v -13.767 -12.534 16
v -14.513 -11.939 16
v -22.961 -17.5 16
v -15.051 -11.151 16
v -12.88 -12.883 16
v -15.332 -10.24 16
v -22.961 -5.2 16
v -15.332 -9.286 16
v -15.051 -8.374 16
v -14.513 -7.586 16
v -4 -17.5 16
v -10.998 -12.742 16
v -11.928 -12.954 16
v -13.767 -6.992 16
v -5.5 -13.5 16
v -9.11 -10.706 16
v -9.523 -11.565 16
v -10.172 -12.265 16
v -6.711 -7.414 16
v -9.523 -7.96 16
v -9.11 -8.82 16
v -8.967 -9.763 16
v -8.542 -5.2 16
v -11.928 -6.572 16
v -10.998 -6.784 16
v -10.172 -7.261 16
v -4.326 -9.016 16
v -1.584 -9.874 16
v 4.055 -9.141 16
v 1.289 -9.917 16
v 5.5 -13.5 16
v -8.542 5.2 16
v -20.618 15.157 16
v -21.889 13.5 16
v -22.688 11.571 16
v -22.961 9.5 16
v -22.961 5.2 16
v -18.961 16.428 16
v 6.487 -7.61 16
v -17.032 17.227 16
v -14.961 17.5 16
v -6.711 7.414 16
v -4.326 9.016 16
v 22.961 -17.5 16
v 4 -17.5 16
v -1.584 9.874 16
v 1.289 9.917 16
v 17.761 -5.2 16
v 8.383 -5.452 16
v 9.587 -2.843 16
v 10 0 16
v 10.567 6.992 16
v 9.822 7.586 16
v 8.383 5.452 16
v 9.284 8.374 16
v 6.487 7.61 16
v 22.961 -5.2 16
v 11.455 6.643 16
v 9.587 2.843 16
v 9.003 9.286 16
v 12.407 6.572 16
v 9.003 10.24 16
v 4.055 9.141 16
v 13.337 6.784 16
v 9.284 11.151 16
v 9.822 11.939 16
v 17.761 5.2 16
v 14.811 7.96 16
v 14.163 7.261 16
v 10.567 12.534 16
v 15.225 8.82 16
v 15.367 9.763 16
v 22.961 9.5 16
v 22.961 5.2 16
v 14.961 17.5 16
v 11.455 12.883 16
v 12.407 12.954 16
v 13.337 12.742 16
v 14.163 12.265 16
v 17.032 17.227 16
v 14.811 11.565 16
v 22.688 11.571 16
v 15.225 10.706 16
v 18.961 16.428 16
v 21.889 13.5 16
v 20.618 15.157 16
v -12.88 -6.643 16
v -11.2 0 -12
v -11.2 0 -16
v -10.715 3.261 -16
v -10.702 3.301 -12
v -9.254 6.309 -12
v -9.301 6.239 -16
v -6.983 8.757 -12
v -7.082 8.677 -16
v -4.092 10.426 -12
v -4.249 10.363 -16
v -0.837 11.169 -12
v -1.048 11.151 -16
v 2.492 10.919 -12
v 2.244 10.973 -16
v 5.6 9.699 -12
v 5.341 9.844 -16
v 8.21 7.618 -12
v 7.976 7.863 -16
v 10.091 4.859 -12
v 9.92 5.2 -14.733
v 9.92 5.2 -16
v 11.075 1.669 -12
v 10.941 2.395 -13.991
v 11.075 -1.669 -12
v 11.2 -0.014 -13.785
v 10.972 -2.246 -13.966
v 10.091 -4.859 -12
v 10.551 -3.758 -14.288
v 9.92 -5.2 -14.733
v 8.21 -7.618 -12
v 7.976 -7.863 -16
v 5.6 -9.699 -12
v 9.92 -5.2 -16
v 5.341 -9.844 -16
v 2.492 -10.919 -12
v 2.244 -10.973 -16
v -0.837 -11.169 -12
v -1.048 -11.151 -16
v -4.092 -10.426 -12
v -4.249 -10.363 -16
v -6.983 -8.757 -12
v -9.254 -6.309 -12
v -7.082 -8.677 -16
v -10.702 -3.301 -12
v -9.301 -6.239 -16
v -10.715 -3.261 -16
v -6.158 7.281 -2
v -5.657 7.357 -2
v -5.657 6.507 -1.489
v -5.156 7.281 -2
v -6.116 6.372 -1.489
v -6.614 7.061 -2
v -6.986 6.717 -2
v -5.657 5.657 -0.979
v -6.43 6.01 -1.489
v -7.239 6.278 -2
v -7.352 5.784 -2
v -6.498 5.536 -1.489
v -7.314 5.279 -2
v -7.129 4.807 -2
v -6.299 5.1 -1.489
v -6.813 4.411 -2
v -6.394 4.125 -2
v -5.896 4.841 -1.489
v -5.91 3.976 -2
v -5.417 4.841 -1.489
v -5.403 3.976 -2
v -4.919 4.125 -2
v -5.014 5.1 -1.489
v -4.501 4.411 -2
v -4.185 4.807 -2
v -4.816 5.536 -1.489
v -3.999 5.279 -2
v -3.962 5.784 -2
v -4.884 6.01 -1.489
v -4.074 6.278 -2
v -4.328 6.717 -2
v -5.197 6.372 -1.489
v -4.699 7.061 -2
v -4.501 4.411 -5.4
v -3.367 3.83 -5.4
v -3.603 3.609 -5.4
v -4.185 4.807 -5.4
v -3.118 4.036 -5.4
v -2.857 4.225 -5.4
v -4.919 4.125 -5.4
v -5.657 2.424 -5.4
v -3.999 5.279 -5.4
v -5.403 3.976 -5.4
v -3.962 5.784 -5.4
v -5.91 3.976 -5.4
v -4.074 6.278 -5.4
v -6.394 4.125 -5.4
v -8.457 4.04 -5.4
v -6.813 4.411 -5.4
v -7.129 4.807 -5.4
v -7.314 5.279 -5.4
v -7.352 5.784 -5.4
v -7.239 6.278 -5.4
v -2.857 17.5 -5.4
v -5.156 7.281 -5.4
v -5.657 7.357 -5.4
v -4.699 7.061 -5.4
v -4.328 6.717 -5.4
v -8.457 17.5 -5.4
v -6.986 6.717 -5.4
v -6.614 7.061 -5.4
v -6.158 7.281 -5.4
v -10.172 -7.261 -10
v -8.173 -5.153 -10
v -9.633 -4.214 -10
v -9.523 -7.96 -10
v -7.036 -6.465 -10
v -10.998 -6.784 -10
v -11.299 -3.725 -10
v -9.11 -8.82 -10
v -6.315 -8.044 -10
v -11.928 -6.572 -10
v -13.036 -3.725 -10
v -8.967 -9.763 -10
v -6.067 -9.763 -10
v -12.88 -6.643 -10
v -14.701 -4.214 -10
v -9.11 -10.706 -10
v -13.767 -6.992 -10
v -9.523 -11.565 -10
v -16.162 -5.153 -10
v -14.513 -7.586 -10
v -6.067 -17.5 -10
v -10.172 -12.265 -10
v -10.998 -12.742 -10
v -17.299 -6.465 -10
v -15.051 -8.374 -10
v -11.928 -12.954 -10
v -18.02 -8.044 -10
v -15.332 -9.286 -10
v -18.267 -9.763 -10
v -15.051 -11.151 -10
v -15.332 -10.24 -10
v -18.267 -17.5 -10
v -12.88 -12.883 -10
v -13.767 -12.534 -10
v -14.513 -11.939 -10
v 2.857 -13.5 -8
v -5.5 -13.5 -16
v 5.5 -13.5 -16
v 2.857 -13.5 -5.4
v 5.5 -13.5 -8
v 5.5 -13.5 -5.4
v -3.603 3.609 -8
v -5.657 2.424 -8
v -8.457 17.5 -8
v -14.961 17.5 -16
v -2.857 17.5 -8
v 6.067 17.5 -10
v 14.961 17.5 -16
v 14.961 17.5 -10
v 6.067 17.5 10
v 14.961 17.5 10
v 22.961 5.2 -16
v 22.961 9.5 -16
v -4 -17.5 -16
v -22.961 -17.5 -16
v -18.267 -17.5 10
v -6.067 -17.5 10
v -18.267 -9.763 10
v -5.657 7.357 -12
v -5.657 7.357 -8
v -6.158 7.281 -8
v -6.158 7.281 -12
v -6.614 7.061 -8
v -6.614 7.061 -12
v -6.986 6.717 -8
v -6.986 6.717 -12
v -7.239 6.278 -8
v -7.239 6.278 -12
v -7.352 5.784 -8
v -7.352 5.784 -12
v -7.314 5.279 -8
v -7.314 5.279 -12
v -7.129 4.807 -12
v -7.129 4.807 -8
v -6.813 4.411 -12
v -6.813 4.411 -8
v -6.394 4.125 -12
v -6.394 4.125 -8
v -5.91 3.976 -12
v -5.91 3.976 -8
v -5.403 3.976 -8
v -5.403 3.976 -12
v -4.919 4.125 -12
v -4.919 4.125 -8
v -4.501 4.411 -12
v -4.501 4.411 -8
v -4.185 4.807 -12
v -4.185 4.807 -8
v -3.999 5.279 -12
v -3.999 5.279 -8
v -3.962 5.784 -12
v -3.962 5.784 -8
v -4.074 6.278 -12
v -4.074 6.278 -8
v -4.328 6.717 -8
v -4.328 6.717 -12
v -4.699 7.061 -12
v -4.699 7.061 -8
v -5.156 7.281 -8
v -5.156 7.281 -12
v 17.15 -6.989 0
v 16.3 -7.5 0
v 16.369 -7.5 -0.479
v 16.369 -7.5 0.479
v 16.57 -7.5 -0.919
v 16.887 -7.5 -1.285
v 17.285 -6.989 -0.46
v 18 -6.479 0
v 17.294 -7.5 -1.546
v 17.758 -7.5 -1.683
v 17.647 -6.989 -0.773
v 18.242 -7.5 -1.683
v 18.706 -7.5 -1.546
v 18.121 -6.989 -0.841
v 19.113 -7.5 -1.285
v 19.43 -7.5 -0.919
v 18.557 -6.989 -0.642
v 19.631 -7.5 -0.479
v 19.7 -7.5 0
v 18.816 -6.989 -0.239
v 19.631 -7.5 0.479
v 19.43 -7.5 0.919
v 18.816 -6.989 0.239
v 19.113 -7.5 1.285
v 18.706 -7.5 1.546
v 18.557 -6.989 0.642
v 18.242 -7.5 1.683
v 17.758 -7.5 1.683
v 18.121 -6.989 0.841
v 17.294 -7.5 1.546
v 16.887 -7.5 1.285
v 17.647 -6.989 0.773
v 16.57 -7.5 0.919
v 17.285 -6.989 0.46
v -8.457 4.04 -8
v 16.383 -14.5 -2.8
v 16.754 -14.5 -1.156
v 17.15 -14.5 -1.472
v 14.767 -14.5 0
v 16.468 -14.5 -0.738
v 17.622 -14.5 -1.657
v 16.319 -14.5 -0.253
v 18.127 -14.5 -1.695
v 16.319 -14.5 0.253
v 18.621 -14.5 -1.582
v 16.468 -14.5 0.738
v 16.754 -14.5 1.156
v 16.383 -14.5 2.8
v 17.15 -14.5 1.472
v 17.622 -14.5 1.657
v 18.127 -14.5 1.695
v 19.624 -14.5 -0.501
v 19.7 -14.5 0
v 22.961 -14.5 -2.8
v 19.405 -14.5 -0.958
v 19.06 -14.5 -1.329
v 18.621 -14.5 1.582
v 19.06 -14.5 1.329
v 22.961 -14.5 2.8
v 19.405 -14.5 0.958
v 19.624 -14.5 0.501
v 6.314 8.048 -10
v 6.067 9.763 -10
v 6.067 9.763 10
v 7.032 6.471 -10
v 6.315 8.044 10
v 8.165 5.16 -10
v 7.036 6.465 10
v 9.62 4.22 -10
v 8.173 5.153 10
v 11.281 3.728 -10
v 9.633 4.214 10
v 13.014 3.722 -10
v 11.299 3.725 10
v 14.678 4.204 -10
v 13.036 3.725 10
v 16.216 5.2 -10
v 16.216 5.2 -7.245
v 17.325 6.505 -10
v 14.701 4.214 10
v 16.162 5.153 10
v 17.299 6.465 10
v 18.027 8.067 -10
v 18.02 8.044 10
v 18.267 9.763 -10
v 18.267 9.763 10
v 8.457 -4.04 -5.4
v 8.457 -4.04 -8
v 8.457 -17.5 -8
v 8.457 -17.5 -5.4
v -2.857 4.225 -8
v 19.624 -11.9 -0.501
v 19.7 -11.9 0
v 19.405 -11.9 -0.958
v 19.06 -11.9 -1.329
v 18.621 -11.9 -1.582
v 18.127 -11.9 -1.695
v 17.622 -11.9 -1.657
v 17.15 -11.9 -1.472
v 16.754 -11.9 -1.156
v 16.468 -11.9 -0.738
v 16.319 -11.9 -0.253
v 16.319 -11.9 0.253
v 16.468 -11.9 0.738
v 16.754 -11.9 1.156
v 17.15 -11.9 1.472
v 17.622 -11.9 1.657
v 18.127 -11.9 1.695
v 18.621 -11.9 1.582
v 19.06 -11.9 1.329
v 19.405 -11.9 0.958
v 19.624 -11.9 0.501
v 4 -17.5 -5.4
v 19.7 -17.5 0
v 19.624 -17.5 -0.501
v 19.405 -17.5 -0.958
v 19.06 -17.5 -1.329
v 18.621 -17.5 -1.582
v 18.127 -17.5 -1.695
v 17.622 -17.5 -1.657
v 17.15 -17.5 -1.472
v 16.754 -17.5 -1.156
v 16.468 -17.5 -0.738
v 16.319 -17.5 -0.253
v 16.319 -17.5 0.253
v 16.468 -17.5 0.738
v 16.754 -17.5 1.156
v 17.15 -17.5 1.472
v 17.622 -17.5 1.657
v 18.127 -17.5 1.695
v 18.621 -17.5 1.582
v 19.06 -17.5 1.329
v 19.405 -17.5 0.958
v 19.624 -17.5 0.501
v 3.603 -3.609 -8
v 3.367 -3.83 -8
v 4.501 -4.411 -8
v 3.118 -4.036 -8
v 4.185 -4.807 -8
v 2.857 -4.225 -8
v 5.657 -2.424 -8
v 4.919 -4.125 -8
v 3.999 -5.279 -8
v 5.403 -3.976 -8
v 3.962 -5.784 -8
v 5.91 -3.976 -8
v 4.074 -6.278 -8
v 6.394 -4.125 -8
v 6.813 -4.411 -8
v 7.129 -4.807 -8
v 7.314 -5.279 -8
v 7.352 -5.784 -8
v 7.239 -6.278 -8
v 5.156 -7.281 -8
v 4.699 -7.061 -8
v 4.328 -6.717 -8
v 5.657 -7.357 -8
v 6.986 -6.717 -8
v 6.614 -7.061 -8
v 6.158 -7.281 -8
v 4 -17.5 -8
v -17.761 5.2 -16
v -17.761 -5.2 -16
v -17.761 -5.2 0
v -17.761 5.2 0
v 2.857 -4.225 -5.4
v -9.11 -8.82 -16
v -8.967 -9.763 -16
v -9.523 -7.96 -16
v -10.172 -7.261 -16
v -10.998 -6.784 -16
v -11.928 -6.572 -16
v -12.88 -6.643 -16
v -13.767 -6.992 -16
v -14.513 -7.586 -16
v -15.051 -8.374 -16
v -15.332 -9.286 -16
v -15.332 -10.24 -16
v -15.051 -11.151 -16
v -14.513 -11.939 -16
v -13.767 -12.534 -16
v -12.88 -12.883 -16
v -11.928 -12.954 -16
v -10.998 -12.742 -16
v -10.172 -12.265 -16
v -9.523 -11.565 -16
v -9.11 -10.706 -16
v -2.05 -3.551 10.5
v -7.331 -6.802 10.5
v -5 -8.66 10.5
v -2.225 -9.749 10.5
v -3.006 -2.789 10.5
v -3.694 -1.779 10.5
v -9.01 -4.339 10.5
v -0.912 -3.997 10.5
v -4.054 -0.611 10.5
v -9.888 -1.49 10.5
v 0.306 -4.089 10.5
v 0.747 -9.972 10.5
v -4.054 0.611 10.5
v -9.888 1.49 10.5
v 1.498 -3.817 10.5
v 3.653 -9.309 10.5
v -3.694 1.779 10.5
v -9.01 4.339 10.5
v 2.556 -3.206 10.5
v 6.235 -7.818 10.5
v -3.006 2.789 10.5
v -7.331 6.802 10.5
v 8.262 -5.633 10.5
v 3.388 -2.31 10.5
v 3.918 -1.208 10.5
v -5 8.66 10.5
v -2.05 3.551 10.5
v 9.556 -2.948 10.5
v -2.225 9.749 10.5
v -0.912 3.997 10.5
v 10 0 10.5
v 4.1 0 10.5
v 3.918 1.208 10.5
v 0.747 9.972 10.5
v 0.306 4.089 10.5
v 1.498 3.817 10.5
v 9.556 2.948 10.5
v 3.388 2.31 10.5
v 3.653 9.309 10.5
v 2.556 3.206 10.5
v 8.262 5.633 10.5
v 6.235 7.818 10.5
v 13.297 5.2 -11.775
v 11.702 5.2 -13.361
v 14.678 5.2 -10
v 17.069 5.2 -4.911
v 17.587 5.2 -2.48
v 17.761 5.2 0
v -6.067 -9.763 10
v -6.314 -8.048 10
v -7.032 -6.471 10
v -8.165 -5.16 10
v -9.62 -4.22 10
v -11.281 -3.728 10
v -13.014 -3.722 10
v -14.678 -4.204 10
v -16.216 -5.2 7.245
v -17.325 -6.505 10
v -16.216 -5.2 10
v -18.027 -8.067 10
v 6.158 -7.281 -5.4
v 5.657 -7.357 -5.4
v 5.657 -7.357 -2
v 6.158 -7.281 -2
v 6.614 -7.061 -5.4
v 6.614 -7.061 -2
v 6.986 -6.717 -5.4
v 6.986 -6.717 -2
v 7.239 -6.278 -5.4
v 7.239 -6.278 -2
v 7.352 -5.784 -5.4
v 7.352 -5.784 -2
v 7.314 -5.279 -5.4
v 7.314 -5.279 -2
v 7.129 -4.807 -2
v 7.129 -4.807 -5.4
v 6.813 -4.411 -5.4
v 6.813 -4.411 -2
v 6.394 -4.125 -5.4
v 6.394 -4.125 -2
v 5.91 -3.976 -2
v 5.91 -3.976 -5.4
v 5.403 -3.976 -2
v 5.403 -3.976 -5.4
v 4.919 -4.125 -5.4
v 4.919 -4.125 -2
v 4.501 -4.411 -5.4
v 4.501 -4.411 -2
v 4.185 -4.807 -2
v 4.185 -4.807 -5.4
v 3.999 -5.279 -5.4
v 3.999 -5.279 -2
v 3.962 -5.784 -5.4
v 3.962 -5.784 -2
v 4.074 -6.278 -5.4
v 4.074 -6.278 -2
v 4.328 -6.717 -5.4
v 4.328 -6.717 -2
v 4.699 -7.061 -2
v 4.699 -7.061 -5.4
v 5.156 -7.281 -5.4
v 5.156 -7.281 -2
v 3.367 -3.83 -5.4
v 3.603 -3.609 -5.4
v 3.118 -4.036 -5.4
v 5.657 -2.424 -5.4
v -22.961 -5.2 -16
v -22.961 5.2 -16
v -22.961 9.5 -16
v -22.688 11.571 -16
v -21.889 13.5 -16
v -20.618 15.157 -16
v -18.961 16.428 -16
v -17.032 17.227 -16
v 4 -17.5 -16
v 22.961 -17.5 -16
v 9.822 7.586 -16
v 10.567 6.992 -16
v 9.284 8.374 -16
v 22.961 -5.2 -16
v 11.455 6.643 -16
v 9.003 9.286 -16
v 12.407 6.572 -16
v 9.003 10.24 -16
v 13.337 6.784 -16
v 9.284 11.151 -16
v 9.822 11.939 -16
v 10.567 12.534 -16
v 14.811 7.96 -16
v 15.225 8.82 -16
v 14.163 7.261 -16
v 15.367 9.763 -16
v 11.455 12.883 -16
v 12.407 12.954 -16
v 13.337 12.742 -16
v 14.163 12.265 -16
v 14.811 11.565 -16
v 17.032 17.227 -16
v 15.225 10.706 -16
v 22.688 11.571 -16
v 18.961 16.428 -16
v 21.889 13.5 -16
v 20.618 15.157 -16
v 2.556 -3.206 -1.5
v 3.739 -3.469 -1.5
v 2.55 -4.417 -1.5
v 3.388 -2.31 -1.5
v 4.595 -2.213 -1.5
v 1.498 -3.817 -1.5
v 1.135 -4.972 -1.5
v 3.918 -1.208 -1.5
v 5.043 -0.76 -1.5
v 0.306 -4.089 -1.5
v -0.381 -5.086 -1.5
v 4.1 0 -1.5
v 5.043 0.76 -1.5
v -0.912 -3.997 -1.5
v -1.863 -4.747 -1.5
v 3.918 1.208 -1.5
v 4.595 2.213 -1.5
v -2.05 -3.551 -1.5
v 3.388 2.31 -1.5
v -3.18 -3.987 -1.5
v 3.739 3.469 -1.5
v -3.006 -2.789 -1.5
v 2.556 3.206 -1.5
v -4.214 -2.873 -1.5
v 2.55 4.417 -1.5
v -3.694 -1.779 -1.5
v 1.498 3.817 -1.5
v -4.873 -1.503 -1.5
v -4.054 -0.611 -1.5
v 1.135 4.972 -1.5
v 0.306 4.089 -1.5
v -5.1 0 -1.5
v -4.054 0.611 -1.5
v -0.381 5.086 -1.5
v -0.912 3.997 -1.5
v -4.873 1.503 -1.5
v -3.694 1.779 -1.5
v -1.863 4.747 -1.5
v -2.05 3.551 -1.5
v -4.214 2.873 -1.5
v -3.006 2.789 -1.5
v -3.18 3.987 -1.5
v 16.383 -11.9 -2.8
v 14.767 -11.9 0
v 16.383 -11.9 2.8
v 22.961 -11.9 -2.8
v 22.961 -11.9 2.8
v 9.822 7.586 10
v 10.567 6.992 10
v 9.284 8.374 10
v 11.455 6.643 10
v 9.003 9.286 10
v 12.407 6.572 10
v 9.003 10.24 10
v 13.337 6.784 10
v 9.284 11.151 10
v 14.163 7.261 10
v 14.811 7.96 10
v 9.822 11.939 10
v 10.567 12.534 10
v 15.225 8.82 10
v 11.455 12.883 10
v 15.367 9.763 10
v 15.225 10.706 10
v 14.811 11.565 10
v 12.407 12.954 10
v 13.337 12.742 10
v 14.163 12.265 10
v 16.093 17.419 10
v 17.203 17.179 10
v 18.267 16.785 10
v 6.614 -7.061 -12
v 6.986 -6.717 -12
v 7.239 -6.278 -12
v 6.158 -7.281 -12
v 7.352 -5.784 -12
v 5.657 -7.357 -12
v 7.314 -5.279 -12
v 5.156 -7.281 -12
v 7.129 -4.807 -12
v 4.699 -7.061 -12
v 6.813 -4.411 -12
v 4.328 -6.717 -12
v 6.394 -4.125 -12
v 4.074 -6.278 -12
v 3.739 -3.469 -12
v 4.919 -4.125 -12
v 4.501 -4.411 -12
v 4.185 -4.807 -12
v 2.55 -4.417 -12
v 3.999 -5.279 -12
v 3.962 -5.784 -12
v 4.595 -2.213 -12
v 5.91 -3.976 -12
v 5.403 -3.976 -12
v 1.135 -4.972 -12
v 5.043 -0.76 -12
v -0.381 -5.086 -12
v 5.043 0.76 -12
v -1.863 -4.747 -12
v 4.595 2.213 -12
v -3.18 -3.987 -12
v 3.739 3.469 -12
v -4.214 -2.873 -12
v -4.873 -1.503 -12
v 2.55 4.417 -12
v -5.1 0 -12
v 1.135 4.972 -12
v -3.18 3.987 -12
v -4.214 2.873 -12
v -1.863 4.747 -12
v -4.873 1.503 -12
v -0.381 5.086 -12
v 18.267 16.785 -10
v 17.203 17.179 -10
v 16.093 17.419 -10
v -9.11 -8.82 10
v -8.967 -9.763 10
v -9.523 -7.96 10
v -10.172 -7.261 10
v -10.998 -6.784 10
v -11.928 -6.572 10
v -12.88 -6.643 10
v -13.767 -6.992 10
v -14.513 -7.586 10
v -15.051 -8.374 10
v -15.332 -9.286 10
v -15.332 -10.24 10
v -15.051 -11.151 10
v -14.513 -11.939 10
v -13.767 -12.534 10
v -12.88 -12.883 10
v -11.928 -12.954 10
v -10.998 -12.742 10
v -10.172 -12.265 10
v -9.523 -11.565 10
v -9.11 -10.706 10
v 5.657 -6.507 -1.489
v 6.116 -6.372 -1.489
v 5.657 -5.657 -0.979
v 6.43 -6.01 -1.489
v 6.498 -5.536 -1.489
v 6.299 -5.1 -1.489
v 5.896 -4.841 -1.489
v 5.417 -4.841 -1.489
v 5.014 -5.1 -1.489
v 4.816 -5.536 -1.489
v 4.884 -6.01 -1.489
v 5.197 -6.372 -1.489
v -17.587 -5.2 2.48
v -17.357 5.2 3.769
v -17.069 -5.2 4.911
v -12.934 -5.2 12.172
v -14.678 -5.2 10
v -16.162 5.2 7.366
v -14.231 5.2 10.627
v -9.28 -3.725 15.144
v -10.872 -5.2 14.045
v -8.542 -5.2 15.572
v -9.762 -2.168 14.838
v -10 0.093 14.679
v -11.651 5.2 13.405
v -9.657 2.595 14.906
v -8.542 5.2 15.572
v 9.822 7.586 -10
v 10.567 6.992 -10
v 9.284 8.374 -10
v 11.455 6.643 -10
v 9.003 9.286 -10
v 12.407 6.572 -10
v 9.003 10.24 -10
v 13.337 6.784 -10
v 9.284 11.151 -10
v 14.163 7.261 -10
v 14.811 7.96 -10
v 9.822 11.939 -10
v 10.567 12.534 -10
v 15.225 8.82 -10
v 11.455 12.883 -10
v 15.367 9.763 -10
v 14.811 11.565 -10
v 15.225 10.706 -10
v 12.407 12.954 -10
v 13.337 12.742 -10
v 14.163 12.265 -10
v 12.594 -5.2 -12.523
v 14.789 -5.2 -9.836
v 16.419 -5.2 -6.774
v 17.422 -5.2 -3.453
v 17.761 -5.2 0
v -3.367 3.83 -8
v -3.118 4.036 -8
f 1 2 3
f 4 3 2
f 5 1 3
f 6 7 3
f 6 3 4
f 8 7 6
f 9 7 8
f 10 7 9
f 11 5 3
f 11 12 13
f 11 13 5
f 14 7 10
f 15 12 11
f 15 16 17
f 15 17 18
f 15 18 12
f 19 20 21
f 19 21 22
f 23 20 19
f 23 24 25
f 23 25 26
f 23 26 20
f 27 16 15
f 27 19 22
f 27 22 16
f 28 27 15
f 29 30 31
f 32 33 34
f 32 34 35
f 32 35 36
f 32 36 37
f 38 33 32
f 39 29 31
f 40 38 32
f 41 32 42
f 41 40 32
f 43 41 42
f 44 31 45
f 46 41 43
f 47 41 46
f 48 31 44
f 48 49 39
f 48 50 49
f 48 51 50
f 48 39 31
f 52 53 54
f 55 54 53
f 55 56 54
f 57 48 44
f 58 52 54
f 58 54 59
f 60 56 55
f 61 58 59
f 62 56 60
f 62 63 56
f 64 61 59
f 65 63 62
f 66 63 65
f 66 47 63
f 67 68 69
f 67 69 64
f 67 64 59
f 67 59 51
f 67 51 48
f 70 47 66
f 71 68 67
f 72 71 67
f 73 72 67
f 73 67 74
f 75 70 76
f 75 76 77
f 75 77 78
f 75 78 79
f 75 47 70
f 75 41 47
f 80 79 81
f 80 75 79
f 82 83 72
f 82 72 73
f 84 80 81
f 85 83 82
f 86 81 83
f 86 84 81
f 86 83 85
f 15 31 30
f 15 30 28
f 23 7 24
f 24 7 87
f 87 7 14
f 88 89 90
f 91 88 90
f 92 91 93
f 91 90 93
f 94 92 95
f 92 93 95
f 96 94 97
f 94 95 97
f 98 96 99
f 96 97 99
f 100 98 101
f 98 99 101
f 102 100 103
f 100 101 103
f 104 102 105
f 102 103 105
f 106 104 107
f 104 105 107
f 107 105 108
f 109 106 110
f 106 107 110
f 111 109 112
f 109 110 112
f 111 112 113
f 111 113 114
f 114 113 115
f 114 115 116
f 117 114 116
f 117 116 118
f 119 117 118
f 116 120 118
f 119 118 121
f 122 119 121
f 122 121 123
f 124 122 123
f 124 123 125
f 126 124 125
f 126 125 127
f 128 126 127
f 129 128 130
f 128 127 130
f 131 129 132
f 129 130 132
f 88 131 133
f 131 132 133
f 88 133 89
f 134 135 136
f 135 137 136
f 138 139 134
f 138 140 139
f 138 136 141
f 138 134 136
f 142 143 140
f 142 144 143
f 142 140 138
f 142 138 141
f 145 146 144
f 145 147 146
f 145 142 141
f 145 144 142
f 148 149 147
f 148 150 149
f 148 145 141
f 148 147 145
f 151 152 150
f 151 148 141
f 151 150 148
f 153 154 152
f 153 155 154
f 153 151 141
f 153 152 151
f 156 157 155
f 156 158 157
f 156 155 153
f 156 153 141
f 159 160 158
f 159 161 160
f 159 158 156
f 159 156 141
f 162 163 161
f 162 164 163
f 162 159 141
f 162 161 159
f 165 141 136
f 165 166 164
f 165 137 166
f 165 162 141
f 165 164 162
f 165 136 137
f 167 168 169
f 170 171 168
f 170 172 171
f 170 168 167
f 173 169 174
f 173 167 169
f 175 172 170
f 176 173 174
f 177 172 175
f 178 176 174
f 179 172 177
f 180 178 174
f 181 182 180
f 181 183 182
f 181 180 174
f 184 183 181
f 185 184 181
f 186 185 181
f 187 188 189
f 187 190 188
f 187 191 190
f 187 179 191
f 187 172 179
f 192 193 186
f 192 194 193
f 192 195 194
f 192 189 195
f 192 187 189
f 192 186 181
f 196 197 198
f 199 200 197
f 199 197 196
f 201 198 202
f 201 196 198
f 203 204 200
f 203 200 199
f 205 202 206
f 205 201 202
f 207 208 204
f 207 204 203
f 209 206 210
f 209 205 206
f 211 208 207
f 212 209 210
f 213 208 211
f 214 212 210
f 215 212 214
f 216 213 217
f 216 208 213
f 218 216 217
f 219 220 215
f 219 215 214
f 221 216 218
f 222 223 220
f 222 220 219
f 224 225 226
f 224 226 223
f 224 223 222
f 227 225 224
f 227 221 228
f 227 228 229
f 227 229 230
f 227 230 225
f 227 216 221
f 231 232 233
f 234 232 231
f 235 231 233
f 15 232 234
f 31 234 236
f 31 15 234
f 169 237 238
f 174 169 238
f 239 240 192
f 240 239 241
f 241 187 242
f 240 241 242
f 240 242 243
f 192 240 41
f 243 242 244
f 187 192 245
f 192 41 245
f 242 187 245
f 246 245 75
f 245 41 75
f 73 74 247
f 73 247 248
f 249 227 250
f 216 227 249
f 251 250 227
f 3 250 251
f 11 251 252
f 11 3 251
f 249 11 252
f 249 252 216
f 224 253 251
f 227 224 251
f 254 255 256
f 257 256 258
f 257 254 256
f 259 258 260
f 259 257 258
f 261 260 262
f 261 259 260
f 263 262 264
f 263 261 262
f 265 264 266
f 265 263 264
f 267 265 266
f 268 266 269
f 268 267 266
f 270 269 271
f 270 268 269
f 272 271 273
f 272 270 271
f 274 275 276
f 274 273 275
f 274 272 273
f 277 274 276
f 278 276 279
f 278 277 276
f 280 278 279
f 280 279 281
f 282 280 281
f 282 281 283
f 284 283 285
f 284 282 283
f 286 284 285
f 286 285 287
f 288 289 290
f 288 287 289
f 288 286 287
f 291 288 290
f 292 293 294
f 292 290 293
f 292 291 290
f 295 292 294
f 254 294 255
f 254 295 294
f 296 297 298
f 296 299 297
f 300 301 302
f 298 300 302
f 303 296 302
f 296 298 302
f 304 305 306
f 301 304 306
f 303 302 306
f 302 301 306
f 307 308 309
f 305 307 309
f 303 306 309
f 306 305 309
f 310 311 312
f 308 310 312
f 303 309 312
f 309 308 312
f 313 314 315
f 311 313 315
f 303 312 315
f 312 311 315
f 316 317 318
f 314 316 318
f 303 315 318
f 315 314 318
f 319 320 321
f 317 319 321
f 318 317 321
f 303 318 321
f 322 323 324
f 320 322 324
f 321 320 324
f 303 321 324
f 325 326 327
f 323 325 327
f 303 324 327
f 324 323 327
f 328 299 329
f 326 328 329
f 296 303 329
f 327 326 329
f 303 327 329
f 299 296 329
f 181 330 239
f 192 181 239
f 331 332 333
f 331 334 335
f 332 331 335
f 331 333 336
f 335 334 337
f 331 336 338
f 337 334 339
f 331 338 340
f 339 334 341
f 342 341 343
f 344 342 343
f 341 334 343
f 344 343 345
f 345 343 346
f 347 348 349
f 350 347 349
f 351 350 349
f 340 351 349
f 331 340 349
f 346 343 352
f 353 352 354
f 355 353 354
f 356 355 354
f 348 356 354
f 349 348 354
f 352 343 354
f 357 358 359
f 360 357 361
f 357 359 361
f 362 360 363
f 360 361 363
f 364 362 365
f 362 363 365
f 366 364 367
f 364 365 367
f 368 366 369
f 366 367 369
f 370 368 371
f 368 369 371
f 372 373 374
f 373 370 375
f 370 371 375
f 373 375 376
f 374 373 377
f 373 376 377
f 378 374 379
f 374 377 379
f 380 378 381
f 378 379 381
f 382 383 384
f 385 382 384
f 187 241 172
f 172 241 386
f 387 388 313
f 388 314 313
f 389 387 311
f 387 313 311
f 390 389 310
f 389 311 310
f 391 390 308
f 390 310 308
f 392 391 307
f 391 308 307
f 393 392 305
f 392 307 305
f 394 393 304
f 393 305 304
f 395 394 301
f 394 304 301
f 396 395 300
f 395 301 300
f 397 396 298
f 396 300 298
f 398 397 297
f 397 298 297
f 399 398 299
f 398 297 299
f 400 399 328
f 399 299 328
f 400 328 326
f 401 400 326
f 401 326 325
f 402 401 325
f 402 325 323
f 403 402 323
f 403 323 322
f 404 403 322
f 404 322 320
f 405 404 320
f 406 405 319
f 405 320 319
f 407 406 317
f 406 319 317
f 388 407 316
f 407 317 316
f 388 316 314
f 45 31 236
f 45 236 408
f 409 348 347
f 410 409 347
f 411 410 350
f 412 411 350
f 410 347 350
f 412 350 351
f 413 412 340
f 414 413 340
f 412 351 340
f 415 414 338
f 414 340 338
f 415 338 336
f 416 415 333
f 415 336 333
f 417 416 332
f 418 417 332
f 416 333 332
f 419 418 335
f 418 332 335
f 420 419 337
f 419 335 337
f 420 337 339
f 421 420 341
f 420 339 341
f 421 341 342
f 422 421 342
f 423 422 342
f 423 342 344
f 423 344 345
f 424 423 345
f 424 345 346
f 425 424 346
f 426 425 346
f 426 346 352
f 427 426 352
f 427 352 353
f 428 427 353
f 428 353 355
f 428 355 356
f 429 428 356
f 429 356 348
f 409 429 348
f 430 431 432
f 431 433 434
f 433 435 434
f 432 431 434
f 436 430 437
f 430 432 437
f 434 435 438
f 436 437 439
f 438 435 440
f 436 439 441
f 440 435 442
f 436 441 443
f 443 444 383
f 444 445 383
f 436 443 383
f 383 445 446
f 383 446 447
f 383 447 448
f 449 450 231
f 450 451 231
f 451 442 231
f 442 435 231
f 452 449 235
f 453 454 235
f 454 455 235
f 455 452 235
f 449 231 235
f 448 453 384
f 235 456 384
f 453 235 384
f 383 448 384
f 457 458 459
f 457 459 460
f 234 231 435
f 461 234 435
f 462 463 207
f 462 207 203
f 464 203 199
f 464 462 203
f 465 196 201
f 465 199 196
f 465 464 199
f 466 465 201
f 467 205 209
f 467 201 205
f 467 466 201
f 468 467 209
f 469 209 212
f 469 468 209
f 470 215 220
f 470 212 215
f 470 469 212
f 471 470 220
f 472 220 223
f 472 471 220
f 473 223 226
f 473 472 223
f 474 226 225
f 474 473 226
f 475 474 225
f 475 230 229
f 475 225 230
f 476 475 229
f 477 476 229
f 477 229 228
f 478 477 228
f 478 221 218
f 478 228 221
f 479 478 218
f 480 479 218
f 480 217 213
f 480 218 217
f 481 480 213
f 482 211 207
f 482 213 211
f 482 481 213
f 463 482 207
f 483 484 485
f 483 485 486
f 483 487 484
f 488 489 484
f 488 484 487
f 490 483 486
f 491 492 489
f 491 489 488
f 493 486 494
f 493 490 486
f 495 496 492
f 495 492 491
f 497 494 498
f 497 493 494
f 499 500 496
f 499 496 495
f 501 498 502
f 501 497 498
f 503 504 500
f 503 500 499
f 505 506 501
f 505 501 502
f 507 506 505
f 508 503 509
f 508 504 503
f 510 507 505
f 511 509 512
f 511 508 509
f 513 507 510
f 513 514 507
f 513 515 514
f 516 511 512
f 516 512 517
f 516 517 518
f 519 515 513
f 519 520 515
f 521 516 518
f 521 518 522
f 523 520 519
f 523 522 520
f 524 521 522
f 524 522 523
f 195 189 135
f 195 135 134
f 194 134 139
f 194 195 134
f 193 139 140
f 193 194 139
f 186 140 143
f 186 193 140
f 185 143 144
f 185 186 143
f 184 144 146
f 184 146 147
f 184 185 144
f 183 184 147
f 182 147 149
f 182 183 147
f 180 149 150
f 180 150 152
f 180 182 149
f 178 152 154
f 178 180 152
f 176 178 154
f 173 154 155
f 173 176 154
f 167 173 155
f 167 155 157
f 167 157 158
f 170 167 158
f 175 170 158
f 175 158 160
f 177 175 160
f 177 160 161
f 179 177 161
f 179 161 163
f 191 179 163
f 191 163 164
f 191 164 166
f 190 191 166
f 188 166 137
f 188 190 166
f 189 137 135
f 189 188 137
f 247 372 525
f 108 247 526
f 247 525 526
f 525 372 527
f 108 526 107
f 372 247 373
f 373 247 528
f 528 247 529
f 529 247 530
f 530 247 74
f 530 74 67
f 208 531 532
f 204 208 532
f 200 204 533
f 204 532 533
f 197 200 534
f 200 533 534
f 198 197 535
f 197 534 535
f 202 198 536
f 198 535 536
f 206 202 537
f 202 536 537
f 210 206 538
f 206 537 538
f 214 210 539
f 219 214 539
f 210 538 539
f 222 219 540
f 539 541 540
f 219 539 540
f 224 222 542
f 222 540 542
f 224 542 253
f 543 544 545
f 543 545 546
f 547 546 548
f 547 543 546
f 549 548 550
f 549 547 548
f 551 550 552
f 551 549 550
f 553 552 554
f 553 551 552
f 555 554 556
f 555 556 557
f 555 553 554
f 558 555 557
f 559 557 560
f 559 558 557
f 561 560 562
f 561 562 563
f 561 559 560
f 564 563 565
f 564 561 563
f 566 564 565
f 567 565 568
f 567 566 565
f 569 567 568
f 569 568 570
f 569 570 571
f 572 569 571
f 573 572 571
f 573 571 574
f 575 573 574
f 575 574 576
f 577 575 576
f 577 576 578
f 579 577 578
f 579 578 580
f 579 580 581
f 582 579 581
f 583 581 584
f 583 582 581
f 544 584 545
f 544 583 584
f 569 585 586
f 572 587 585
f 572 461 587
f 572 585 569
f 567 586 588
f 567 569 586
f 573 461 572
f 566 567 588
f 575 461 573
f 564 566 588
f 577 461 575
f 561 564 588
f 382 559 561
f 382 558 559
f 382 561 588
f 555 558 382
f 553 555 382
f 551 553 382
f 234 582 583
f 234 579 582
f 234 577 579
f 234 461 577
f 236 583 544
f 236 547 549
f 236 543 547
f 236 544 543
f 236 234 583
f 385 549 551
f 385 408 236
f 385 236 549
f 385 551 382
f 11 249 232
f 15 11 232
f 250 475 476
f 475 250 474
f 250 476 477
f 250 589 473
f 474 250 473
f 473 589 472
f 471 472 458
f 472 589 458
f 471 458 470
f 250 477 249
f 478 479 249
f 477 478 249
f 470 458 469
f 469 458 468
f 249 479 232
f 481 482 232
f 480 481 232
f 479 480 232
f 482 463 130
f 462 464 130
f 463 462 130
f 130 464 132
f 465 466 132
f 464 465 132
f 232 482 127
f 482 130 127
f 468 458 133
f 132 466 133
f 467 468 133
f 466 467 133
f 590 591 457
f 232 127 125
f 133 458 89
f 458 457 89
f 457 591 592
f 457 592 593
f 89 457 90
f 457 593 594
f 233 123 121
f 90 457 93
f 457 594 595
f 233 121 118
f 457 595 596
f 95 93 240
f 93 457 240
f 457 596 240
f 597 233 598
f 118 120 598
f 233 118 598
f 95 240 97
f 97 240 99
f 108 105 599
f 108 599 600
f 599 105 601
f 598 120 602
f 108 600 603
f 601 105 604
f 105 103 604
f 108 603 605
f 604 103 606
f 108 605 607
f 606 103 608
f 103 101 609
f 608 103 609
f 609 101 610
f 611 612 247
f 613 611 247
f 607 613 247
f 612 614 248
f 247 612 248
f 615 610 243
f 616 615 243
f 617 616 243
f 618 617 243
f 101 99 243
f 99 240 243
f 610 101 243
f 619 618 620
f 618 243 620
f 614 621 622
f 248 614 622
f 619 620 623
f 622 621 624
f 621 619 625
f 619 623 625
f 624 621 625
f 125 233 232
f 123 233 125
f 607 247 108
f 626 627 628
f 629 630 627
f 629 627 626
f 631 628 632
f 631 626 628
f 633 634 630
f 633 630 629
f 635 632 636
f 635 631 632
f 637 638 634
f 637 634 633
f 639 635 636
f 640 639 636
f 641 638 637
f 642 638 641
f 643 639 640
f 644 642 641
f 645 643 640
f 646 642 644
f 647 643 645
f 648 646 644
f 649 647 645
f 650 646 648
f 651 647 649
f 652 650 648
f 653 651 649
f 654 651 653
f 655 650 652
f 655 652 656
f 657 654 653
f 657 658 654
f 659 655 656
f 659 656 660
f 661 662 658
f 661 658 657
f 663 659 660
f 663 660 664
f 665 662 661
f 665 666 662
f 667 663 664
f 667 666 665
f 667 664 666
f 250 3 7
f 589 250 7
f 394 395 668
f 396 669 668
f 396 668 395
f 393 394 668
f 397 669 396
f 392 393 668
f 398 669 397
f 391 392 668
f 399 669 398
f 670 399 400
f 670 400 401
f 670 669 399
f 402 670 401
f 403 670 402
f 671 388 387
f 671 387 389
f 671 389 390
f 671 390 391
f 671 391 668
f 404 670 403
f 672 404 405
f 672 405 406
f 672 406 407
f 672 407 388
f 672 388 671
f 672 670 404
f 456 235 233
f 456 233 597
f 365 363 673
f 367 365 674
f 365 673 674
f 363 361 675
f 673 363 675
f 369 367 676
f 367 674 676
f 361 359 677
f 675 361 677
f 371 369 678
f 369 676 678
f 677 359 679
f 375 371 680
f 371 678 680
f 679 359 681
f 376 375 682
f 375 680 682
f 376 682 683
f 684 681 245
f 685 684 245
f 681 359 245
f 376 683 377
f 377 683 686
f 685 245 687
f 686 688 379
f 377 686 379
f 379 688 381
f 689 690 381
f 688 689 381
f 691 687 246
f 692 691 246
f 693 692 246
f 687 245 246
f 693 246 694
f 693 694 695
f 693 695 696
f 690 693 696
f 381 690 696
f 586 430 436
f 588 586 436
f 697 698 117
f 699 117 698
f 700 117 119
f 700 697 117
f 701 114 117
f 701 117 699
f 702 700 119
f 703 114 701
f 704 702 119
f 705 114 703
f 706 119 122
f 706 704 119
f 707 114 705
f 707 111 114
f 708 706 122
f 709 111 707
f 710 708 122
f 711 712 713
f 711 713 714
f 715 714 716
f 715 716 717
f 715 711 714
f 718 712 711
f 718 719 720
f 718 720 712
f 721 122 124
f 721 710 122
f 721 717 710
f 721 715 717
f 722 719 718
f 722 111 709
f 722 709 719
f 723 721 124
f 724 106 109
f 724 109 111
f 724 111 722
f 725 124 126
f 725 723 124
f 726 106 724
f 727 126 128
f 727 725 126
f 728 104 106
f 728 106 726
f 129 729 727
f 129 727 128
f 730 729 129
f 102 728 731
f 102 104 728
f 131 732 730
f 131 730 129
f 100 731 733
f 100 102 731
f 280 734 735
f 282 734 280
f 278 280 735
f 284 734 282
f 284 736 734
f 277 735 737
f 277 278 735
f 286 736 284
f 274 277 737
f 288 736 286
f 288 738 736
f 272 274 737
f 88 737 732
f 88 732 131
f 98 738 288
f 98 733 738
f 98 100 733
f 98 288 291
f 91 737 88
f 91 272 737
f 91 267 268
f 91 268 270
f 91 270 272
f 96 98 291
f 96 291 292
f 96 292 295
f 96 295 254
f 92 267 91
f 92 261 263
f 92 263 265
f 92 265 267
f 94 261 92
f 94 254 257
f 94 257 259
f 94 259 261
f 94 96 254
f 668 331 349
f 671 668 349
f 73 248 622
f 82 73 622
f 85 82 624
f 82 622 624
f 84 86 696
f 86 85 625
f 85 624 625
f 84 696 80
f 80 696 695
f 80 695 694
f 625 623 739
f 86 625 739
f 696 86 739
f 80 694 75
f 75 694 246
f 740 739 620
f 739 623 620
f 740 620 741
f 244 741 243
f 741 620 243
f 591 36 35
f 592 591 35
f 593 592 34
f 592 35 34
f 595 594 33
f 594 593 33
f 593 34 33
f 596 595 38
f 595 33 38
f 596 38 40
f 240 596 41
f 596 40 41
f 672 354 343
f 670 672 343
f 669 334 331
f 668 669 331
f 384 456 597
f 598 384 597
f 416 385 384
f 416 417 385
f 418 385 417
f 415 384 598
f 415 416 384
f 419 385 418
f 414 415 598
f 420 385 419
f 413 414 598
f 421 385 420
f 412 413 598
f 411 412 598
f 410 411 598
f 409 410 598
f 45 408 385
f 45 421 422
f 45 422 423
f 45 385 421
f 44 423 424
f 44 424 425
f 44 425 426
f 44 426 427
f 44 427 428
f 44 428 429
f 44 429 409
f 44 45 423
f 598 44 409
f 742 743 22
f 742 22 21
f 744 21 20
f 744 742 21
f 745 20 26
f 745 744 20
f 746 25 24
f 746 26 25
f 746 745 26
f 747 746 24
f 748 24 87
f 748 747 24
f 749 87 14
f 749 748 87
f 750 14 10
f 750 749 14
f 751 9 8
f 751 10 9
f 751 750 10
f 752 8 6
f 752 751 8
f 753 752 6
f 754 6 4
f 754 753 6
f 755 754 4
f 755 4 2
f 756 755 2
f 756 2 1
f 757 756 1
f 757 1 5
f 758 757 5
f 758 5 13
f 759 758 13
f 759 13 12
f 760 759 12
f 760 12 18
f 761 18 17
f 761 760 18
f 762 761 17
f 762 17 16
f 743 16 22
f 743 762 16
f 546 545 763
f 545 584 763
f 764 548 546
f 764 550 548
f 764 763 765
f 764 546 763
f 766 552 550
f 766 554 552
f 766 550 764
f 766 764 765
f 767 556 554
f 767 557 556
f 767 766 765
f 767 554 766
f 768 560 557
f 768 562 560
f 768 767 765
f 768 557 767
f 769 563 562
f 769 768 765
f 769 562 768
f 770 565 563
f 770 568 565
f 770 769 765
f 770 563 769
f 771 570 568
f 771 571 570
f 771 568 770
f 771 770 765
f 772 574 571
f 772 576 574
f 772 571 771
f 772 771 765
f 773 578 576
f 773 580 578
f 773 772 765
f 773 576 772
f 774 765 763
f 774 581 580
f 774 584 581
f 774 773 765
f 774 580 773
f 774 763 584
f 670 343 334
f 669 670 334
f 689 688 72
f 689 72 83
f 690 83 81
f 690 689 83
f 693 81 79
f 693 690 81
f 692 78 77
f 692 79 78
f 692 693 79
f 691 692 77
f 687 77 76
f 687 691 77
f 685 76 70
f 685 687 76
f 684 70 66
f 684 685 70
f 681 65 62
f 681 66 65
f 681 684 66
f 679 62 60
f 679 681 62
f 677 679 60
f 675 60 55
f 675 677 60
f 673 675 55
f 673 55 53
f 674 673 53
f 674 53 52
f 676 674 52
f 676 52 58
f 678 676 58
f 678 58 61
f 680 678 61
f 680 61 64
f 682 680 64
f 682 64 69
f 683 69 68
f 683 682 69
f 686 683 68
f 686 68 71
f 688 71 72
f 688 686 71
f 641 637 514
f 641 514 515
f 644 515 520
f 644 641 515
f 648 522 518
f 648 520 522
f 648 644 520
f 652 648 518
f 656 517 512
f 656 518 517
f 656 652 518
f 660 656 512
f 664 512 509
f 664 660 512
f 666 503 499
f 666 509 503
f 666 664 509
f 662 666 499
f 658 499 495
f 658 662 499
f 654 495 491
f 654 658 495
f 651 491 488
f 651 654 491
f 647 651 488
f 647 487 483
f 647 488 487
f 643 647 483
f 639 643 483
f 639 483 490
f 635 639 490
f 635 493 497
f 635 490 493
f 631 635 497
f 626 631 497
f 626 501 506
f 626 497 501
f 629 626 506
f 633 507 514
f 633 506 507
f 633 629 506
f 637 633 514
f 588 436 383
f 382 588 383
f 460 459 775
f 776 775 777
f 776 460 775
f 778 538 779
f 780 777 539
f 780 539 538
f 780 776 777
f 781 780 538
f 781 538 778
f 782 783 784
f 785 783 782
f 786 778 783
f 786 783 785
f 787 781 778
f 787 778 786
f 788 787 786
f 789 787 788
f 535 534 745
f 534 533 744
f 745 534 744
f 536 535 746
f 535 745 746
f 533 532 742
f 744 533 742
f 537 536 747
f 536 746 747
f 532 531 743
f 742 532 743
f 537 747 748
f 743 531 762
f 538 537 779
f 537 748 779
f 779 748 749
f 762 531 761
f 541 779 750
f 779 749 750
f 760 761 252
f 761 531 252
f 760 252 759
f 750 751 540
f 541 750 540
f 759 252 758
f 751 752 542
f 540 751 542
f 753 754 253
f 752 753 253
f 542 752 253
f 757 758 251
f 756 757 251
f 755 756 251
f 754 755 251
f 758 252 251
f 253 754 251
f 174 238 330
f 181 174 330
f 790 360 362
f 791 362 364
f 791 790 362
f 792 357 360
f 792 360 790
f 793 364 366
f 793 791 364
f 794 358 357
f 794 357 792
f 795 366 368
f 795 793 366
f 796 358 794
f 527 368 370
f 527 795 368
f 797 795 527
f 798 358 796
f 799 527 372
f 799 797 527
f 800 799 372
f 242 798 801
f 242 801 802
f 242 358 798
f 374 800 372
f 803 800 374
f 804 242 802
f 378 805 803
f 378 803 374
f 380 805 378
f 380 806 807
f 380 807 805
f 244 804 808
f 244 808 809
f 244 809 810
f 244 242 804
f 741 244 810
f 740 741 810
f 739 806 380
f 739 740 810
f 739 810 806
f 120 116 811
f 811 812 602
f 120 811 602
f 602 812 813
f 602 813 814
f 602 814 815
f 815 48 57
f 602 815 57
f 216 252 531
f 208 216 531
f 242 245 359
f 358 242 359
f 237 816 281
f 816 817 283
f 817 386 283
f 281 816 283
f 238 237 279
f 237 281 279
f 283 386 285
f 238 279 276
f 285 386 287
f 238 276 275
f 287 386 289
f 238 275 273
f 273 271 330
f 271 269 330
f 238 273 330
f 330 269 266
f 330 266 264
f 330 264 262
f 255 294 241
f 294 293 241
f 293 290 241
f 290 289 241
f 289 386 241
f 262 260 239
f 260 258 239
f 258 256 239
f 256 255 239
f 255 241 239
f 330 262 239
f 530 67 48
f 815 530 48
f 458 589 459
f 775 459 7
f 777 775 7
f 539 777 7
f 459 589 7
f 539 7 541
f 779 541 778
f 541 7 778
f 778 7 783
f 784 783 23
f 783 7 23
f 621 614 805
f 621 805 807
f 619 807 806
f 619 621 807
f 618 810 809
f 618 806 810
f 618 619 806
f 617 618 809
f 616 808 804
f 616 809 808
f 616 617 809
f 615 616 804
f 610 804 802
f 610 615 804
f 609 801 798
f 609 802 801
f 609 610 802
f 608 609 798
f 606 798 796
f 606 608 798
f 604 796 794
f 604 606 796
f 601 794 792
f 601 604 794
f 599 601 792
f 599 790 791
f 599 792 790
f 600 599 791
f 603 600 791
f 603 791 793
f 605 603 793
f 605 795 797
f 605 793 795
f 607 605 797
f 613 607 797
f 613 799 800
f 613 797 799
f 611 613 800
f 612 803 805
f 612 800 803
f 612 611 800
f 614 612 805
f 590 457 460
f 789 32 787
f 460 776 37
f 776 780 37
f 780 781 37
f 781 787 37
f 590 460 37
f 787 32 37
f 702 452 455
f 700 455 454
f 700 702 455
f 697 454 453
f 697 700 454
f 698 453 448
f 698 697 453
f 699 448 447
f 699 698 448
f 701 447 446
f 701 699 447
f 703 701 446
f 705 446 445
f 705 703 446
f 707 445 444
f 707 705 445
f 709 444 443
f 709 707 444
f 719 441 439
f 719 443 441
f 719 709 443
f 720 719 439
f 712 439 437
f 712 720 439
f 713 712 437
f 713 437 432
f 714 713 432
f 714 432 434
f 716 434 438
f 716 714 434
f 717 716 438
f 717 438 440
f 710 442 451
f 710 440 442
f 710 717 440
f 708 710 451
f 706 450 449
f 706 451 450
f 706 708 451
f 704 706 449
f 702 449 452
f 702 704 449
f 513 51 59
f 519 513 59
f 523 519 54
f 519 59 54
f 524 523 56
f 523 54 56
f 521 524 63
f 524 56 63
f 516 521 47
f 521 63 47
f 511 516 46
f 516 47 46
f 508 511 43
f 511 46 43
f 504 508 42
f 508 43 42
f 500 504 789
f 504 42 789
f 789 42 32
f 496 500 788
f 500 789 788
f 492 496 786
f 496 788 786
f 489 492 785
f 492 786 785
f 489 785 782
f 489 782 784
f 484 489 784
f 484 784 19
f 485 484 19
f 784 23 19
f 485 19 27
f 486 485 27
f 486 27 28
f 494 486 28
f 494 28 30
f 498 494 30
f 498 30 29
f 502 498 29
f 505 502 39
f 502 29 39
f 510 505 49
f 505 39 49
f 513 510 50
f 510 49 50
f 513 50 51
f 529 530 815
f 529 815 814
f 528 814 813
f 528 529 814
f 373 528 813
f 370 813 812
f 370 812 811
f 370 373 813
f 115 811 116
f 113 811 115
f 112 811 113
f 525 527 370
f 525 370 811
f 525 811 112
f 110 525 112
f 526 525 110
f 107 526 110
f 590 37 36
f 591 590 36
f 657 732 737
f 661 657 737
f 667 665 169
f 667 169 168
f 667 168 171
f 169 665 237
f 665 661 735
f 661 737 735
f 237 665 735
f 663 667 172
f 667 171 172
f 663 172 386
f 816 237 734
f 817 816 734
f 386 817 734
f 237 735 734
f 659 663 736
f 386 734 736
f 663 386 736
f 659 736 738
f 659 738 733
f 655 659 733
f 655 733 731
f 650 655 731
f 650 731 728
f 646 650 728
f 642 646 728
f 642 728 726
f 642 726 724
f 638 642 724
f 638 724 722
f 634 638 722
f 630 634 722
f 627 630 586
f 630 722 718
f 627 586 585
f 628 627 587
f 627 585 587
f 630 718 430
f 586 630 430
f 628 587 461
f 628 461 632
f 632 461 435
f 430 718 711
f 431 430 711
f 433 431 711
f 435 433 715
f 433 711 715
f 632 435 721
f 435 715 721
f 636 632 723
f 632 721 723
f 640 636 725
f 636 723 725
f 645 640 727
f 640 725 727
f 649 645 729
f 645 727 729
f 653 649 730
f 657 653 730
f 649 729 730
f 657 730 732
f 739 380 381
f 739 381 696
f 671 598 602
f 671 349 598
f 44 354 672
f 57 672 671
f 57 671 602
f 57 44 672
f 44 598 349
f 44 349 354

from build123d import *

# Parameters (mm, degrees)
SKETCH1_W                = 45.922011884
SKETCH1_H                = 35
BOSS_EXTRUDE1_DEPTH      = 16
CUT_EXTRUDE1_DEPTH       = 34.006935542
CUT_EXTRUDE1_DEPTH_BACK  = 34.006935542
SKETCH2_R                = 4.1
CUT_EXTRUDE2_REACH       = 45.098
SKETCH4_W                = 5
SKETCH4_H                = 10
CUT_EXTRUDE3_DEPTH       = 10
SKETCH6_R                = 11.2
CUT_EXTRUDE4_DEPTH       = 4
SKETCH7_R                = 5.1
CUT_EXTRUDE5_DEPTH       = 10.5
CIRPATTERN1_COUNT        = 2
CUT_EXTRUDE6_DEPTH       = 34.006935542
CUT_EXTRUDE6_DEPTH_BACK  = 34.006935542
SKETCH8_R                = 3.2
FILLET1_R                = 8
CUT_EXTRUDE8_START       = -4
SKETCH9_R                = 5.1
CUT_EXTRUDE8_DEPTH       = 2.6
CIRPATTERN2_COUNT        = 2
SKETCH13_W               = 32.238994058
SKETCH13_H               = 10.4
CUT_REVOLVE1_ANGLE       = 90
SKETCH14_R               = 10
CUT_EXTRUDE9_DEPTH       = 5.5
CUT_EXTRUDE10_DEPTH      = 44.098234306
CUT_EXTRUDE11_START      = -3
CUT_EXTRUDE11_DEPTH      = 2.6
M3_CLEARANCE_HOLE2_D     = 3.4
M3_CLEARANCE_HOLE2_DEPTH = 10
M3_CLEARANCE_HOLE2_TIP   = 1.021463052


with BuildPart() as part:
    # Sketch1 → Boss-Extrude1 (new, symmetric)
    with BuildSketch(Plane.XY):
        Rectangle(SKETCH1_W, SKETCH1_H)
    extrude(amount=BOSS_EXTRUDE1_DEPTH, both=True)

    # Sketch2 → Cut-Extrude1 (cut, two sides: drawn at the far end of the back side and taken through both)
    with BuildSketch(Plane.XY.offset(-CUT_EXTRUDE1_DEPTH_BACK)):
        Circle(SKETCH2_R)
    extrude(amount=CUT_EXTRUDE1_DEPTH + CUT_EXTRUDE1_DEPTH_BACK, mode=Mode.SUBTRACT)

    # Sketch4 → Cut-Extrude2 (cut, up to next)
    with BuildSketch(Plane.XY.offset(16), mode=Mode.PRIVATE) as cut_extrude2_sk1:
        with Locations((20.461005942, 0)):
            Rectangle(SKETCH4_W, SKETCH4_H)
    cut_extrude2_tool1 = extrude(cut_extrude2_sk1.sketch, amount=-CUT_EXTRUDE2_REACH, mode=Mode.PRIVATE) & part.part
    # Sketch4 → Cut-Extrude2 (cut, up to next)
    with BuildSketch(Plane.XY.offset(16), mode=Mode.PRIVATE) as cut_extrude2_sk2:
        with Locations((-20.461005942, 0)):
            Rectangle(SKETCH4_W, SKETCH4_H)
    cut_extrude2_tool2 = extrude(cut_extrude2_sk2.sketch, amount=-CUT_EXTRUDE2_REACH, mode=Mode.PRIVATE) & part.part
    # Sketch4 → Cut-Extrude2 (cut, up to next)
    with BuildSketch(Plane.XY.offset(16), mode=Mode.PRIVATE) as cut_extrude2_sk3:
        Polygon((17.961005942, 5), (22.961005942, 5), (22.961005942, 5.2), (17.761005942, 5.2), (17.761005942, -5.2), (22.961005942, -5.2), (22.961005942, -5), (17.961005942, -5), align=None)
    cut_extrude2_tool3 = extrude(cut_extrude2_sk3.sketch, amount=-CUT_EXTRUDE2_REACH, mode=Mode.PRIVATE) & part.part
    # Sketch4 → Cut-Extrude2 (cut, up to next)
    with BuildSketch(Plane.XY.offset(16), mode=Mode.PRIVATE) as cut_extrude2_sk4:
        Polygon((-22.961005942, 5.2), (-22.961005942, 5), (-17.961005942, 5), (-17.961005942, -5), (-22.961005942, -5), (-22.961005942, -5.2), (-17.761005942, -5.2), (-17.761005942, 5.2), align=None)
    cut_extrude2_tool4 = extrude(cut_extrude2_sk4.sketch, amount=-CUT_EXTRUDE2_REACH, mode=Mode.PRIVATE) & part.part
    add(cut_extrude2_tool1.solids().sort_by_distance((20.461006, 0, 16))[0], mode=Mode.SUBTRACT)
    add(cut_extrude2_tool2.solids().sort_by_distance((-20.461006, 0, 16))[0], mode=Mode.SUBTRACT)
    add(cut_extrude2_tool3.solids().sort_by_distance((17.84473, 0, 16))[0], mode=Mode.SUBTRACT)
    add(cut_extrude2_tool4.solids().sort_by_distance((-22.84473, 5.1, 16))[0], mode=Mode.SUBTRACT)

    # Sketch5 → Cut-Extrude3 (cut, symmetric)
    # profile 1 of 2: a face of its own
    with BuildSketch(Plane.XY):
        with BuildLine():
            Line((6.067449647, 17.6), (6.067449647, 9.762846361))
            ThreePointArc((6.067449647, 9.762846361), (12.167449647, 3.662846361), (18.267449647, 9.762846361))
            Line((18.267449647, 9.762846361), (18.267449647, 17.6))
            Line((18.267449647, 17.6), (6.067449647, 17.6))
        make_face()
        with BuildLine():
            ThreePointArc((6.167449647, 9.762846361), (12.167449647, 3.762846361), (18.167449647, 9.762846361))
            Line((18.167449647, 9.762846361), (18.167449647, 17.5))
            Line((18.167449647, 17.5), (6.167449647, 17.5))
            Line((6.167449647, 17.5), (6.167449647, 9.762846361))
        make_face(mode=Mode.SUBTRACT)
    # profile 2 of 2: a face of its own
    with BuildSketch(Plane.XY):
        with BuildLine():
            Line((6.167449647, 17.5), (6.167449647, 9.762846361))
            ThreePointArc((6.167449647, 9.762846361), (12.167449647, 3.762846361), (18.167449647, 9.762846361))
            Line((18.167449647, 9.762846361), (18.167449647, 17.5))
            Line((18.167449647, 17.5), (6.167449647, 17.5))
        make_face()
    cut_extrude3 = extrude(amount=CUT_EXTRUDE3_DEPTH, both=True, mode=Mode.SUBTRACT)

    # Sketch6 → Cut-Extrude4 (cut)
    with BuildSketch(Plane(origin=(0, 0, -16), x_dir=(-1, 0, 0), z_dir=(0, 0, -1))):
        Circle(SKETCH6_R)
    extrude(amount=-CUT_EXTRUDE4_DEPTH, mode=Mode.SUBTRACT)

    # Sketch7 → Cut-Extrude5 (cut)
    with BuildSketch(Plane(origin=(0, 0, -12), x_dir=(-1, 0, 0), z_dir=(0, 0, -1))):
        Circle(SKETCH7_R)
    extrude(amount=-CUT_EXTRUDE5_DEPTH, mode=Mode.SUBTRACT)

    # CirPattern1: Cut-Extrude3 ×2 about axis
    cirpattern1_axis = Axis((0, 0, 0), (0, 0, 1))
    for i in range(1, CIRPATTERN1_COUNT):
        add(cut_extrude3.rotate(cirpattern1_axis, i * 360 / CIRPATTERN1_COUNT), mode=Mode.SUBTRACT)

    # Sketch8 → Cut-Extrude6 (cut, two sides: drawn at the far end of the back side and taken through both)
    with BuildSketch(Plane.XY.offset(-CUT_EXTRUDE6_DEPTH_BACK)):
        with Locations((-12.167449647, -9.762846361)):
            Circle(SKETCH8_R)
        with Locations((12.167449647, 9.762846361)):
            Circle(SKETCH8_R)
    extrude(amount=CUT_EXTRUDE6_DEPTH + CUT_EXTRUDE6_DEPTH_BACK, mode=Mode.SUBTRACT)

    # Fillet1
    # the kernel refuses this fillet: 8 mm, written as the material it takes off along each edge
    with BuildSketch(Plane(origin=(22.961005942, 17.5, -36), x_dir=(-1, 0, 0), z_dir=(0, 0, 1))) as fillet1_piece_1:
        with BuildLine():
            CenterArc((FILLET1_R, FILLET1_R), FILLET1_R, 180, 90)
            Line((0, FILLET1_R), (0, 0))
            Line((0, 0), (FILLET1_R, 0))
        make_face()
    extrude(amount=72, mode=Mode.SUBTRACT)
    with BuildSketch(Plane(origin=(-22.961005942, 17.5, 36), x_dir=(0, -1, 0), z_dir=(0, 0, -1))) as fillet1_piece_2:
        with BuildLine():
            CenterArc((FILLET1_R, -FILLET1_R), FILLET1_R, 90, 90)
            Line((0, -FILLET1_R), (0, 0))
            Line((0, 0), (FILLET1_R, 0))
        make_face()
    extrude(amount=72, mode=Mode.SUBTRACT)

    # Sketch9 → Cut-Extrude8 (cut)
    with BuildSketch(Plane(origin=(0, 0, -12), x_dir=(-1, 0, 0), z_dir=(0, 0, -1)).offset(CUT_EXTRUDE8_START)):
        with BuildLine():
            Line((2.856854249, 17.5), (2.856854249, 10.829514477))
            ThreePointArc((2.856854249, 10.829514477), (5.919350665, 9.507959177), (8.456854249, 7.34313395))
            Line((8.456854249, 7.34313395), (8.456854249, 17.5))
            Line((8.456854249, 17.5), (2.856854249, 17.5))
        make_face()
        Circle(SKETCH9_R)
        Polygon((2.856854249, 4.040273496), (5.656854249, 2.423692742), (8.456854249, 4.040273496), (8.456854249, 7.273435003), (5.656854249, 8.890015757), (2.856854249, 7.273435003), align=None)
        with BuildLine():
            Line((2.856854249, 10.829514477), (2.856854249, 7.273435003))
            Line((2.856854249, 7.273435003), (5.656854249, 8.890015757))
            Line((5.656854249, 8.890015757), (8.456854249, 7.273435003))
            Line((8.456854249, 7.273435003), (8.456854249, 7.34313395))
            ThreePointArc((8.456854249, 7.34313395), (5.919350665, 9.507959177), (2.856854249, 10.829514477))
        make_face()
    cut_extrude8 = extrude(amount=-CUT_EXTRUDE8_DEPTH, mode=Mode.SUBTRACT)

    # Sketch11 → M3 Clearance Hole1 (revolve, cut)
    with BuildSketch(Plane(origin=(-5.656854249, 5.656854249, -12), x_dir=(0, 1, 0), z_dir=(1, 0, 0))):
        Polygon((0, 0), (0, 11.021463052), (1.7, 10), (1.7, 0), align=None)
    m3_clearance_hole1 = revolve(axis=Axis((-5.656854249, 5.656854249, -18.35), (0, 0, 1)), mode=Mode.SUBTRACT)

    # CirPattern2: Cut-Extrude8, M3 Clearance Hole1 ×2 about axis
    cirpattern2_axis = Axis((0, 0, 0), (0, 0, 1))
    add([cut_extrude8.rotate(cirpattern2_axis, i * 360 / CIRPATTERN2_COUNT) for i in range(1, CIRPATTERN2_COUNT)], mode=Mode.SUBTRACT)
    add([m3_clearance_hole1.rotate(cirpattern2_axis, i * 360 / CIRPATTERN2_COUNT) for i in range(1, CIRPATTERN2_COUNT)], mode=Mode.SUBTRACT)

    # Sketch13 → Cut-Revolve1 (revolve, cut)
    with BuildSketch(Plane.XY):
        with Locations((33.880502971, 0)):
            Rectangle(SKETCH13_W, SKETCH13_H)
        with Locations((-33.880502971, 0)):
            Rectangle(SKETCH13_W, SKETCH13_H)
    revolve(axis=Axis((0, 0, 0), (0, 1, 0)), revolution_arc=CUT_REVOLVE1_ANGLE, mode=Mode.SUBTRACT)

    # Sketch14 → Cut-Extrude9 (cut)
    with BuildSketch(Plane.XY.offset(16)):
        Circle(SKETCH14_R)
    extrude(amount=-CUT_EXTRUDE9_DEPTH, mode=Mode.SUBTRACT)

    # Sketch15 → Cut-Extrude10 (cut, through all)
    with BuildSketch(Plane.XY.offset(16)):
        Polygon((-4, -17.5), (-5.5, -13.5), (5.5, -13.5), (4, -17.5), align=None)
    extrude(amount=-CUT_EXTRUDE10_DEPTH, mode=Mode.SUBTRACT)

    # Sketch16 → Cut-Extrude11 (cut)
    with BuildSketch(Plane.XZ.offset(17.5).offset(CUT_EXTRUDE11_START)):
        Polygon((19.616580754, -2.8), (21.233161507, 0), (19.616580754, 2.8), (16.383419246, 2.8), (14.766838493, 0), (16.383419246, -2.8), align=None)
        Polygon((21.233161507, 0), (19.616580754, -2.8), (22.961005942, -2.8), (22.961005942, 2.8), (19.616580754, 2.8), align=None)
    extrude(amount=-CUT_EXTRUDE11_DEPTH, mode=Mode.SUBTRACT)

    # M3 Clearance Hole2
    with Locations(Plane(origin=(0, -17.5, 0), x_dir=(-1, 0, 0), z_dir=(0, -1, 0))):
        with Locations((-18, 0)):
            Hole(M3_CLEARANCE_HOLE2_D / 2, depth=M3_CLEARANCE_HOLE2_DEPTH)
            with Locations((0, 0, -(M3_CLEARANCE_HOLE2_DEPTH + M3_CLEARANCE_HOLE2_TIP / 2))):  # 118° drill point
                Cone(0, M3_CLEARANCE_HOLE2_D / 2, M3_CLEARANCE_HOLE2_TIP, mode=Mode.SUBTRACT)


solid = part.part
